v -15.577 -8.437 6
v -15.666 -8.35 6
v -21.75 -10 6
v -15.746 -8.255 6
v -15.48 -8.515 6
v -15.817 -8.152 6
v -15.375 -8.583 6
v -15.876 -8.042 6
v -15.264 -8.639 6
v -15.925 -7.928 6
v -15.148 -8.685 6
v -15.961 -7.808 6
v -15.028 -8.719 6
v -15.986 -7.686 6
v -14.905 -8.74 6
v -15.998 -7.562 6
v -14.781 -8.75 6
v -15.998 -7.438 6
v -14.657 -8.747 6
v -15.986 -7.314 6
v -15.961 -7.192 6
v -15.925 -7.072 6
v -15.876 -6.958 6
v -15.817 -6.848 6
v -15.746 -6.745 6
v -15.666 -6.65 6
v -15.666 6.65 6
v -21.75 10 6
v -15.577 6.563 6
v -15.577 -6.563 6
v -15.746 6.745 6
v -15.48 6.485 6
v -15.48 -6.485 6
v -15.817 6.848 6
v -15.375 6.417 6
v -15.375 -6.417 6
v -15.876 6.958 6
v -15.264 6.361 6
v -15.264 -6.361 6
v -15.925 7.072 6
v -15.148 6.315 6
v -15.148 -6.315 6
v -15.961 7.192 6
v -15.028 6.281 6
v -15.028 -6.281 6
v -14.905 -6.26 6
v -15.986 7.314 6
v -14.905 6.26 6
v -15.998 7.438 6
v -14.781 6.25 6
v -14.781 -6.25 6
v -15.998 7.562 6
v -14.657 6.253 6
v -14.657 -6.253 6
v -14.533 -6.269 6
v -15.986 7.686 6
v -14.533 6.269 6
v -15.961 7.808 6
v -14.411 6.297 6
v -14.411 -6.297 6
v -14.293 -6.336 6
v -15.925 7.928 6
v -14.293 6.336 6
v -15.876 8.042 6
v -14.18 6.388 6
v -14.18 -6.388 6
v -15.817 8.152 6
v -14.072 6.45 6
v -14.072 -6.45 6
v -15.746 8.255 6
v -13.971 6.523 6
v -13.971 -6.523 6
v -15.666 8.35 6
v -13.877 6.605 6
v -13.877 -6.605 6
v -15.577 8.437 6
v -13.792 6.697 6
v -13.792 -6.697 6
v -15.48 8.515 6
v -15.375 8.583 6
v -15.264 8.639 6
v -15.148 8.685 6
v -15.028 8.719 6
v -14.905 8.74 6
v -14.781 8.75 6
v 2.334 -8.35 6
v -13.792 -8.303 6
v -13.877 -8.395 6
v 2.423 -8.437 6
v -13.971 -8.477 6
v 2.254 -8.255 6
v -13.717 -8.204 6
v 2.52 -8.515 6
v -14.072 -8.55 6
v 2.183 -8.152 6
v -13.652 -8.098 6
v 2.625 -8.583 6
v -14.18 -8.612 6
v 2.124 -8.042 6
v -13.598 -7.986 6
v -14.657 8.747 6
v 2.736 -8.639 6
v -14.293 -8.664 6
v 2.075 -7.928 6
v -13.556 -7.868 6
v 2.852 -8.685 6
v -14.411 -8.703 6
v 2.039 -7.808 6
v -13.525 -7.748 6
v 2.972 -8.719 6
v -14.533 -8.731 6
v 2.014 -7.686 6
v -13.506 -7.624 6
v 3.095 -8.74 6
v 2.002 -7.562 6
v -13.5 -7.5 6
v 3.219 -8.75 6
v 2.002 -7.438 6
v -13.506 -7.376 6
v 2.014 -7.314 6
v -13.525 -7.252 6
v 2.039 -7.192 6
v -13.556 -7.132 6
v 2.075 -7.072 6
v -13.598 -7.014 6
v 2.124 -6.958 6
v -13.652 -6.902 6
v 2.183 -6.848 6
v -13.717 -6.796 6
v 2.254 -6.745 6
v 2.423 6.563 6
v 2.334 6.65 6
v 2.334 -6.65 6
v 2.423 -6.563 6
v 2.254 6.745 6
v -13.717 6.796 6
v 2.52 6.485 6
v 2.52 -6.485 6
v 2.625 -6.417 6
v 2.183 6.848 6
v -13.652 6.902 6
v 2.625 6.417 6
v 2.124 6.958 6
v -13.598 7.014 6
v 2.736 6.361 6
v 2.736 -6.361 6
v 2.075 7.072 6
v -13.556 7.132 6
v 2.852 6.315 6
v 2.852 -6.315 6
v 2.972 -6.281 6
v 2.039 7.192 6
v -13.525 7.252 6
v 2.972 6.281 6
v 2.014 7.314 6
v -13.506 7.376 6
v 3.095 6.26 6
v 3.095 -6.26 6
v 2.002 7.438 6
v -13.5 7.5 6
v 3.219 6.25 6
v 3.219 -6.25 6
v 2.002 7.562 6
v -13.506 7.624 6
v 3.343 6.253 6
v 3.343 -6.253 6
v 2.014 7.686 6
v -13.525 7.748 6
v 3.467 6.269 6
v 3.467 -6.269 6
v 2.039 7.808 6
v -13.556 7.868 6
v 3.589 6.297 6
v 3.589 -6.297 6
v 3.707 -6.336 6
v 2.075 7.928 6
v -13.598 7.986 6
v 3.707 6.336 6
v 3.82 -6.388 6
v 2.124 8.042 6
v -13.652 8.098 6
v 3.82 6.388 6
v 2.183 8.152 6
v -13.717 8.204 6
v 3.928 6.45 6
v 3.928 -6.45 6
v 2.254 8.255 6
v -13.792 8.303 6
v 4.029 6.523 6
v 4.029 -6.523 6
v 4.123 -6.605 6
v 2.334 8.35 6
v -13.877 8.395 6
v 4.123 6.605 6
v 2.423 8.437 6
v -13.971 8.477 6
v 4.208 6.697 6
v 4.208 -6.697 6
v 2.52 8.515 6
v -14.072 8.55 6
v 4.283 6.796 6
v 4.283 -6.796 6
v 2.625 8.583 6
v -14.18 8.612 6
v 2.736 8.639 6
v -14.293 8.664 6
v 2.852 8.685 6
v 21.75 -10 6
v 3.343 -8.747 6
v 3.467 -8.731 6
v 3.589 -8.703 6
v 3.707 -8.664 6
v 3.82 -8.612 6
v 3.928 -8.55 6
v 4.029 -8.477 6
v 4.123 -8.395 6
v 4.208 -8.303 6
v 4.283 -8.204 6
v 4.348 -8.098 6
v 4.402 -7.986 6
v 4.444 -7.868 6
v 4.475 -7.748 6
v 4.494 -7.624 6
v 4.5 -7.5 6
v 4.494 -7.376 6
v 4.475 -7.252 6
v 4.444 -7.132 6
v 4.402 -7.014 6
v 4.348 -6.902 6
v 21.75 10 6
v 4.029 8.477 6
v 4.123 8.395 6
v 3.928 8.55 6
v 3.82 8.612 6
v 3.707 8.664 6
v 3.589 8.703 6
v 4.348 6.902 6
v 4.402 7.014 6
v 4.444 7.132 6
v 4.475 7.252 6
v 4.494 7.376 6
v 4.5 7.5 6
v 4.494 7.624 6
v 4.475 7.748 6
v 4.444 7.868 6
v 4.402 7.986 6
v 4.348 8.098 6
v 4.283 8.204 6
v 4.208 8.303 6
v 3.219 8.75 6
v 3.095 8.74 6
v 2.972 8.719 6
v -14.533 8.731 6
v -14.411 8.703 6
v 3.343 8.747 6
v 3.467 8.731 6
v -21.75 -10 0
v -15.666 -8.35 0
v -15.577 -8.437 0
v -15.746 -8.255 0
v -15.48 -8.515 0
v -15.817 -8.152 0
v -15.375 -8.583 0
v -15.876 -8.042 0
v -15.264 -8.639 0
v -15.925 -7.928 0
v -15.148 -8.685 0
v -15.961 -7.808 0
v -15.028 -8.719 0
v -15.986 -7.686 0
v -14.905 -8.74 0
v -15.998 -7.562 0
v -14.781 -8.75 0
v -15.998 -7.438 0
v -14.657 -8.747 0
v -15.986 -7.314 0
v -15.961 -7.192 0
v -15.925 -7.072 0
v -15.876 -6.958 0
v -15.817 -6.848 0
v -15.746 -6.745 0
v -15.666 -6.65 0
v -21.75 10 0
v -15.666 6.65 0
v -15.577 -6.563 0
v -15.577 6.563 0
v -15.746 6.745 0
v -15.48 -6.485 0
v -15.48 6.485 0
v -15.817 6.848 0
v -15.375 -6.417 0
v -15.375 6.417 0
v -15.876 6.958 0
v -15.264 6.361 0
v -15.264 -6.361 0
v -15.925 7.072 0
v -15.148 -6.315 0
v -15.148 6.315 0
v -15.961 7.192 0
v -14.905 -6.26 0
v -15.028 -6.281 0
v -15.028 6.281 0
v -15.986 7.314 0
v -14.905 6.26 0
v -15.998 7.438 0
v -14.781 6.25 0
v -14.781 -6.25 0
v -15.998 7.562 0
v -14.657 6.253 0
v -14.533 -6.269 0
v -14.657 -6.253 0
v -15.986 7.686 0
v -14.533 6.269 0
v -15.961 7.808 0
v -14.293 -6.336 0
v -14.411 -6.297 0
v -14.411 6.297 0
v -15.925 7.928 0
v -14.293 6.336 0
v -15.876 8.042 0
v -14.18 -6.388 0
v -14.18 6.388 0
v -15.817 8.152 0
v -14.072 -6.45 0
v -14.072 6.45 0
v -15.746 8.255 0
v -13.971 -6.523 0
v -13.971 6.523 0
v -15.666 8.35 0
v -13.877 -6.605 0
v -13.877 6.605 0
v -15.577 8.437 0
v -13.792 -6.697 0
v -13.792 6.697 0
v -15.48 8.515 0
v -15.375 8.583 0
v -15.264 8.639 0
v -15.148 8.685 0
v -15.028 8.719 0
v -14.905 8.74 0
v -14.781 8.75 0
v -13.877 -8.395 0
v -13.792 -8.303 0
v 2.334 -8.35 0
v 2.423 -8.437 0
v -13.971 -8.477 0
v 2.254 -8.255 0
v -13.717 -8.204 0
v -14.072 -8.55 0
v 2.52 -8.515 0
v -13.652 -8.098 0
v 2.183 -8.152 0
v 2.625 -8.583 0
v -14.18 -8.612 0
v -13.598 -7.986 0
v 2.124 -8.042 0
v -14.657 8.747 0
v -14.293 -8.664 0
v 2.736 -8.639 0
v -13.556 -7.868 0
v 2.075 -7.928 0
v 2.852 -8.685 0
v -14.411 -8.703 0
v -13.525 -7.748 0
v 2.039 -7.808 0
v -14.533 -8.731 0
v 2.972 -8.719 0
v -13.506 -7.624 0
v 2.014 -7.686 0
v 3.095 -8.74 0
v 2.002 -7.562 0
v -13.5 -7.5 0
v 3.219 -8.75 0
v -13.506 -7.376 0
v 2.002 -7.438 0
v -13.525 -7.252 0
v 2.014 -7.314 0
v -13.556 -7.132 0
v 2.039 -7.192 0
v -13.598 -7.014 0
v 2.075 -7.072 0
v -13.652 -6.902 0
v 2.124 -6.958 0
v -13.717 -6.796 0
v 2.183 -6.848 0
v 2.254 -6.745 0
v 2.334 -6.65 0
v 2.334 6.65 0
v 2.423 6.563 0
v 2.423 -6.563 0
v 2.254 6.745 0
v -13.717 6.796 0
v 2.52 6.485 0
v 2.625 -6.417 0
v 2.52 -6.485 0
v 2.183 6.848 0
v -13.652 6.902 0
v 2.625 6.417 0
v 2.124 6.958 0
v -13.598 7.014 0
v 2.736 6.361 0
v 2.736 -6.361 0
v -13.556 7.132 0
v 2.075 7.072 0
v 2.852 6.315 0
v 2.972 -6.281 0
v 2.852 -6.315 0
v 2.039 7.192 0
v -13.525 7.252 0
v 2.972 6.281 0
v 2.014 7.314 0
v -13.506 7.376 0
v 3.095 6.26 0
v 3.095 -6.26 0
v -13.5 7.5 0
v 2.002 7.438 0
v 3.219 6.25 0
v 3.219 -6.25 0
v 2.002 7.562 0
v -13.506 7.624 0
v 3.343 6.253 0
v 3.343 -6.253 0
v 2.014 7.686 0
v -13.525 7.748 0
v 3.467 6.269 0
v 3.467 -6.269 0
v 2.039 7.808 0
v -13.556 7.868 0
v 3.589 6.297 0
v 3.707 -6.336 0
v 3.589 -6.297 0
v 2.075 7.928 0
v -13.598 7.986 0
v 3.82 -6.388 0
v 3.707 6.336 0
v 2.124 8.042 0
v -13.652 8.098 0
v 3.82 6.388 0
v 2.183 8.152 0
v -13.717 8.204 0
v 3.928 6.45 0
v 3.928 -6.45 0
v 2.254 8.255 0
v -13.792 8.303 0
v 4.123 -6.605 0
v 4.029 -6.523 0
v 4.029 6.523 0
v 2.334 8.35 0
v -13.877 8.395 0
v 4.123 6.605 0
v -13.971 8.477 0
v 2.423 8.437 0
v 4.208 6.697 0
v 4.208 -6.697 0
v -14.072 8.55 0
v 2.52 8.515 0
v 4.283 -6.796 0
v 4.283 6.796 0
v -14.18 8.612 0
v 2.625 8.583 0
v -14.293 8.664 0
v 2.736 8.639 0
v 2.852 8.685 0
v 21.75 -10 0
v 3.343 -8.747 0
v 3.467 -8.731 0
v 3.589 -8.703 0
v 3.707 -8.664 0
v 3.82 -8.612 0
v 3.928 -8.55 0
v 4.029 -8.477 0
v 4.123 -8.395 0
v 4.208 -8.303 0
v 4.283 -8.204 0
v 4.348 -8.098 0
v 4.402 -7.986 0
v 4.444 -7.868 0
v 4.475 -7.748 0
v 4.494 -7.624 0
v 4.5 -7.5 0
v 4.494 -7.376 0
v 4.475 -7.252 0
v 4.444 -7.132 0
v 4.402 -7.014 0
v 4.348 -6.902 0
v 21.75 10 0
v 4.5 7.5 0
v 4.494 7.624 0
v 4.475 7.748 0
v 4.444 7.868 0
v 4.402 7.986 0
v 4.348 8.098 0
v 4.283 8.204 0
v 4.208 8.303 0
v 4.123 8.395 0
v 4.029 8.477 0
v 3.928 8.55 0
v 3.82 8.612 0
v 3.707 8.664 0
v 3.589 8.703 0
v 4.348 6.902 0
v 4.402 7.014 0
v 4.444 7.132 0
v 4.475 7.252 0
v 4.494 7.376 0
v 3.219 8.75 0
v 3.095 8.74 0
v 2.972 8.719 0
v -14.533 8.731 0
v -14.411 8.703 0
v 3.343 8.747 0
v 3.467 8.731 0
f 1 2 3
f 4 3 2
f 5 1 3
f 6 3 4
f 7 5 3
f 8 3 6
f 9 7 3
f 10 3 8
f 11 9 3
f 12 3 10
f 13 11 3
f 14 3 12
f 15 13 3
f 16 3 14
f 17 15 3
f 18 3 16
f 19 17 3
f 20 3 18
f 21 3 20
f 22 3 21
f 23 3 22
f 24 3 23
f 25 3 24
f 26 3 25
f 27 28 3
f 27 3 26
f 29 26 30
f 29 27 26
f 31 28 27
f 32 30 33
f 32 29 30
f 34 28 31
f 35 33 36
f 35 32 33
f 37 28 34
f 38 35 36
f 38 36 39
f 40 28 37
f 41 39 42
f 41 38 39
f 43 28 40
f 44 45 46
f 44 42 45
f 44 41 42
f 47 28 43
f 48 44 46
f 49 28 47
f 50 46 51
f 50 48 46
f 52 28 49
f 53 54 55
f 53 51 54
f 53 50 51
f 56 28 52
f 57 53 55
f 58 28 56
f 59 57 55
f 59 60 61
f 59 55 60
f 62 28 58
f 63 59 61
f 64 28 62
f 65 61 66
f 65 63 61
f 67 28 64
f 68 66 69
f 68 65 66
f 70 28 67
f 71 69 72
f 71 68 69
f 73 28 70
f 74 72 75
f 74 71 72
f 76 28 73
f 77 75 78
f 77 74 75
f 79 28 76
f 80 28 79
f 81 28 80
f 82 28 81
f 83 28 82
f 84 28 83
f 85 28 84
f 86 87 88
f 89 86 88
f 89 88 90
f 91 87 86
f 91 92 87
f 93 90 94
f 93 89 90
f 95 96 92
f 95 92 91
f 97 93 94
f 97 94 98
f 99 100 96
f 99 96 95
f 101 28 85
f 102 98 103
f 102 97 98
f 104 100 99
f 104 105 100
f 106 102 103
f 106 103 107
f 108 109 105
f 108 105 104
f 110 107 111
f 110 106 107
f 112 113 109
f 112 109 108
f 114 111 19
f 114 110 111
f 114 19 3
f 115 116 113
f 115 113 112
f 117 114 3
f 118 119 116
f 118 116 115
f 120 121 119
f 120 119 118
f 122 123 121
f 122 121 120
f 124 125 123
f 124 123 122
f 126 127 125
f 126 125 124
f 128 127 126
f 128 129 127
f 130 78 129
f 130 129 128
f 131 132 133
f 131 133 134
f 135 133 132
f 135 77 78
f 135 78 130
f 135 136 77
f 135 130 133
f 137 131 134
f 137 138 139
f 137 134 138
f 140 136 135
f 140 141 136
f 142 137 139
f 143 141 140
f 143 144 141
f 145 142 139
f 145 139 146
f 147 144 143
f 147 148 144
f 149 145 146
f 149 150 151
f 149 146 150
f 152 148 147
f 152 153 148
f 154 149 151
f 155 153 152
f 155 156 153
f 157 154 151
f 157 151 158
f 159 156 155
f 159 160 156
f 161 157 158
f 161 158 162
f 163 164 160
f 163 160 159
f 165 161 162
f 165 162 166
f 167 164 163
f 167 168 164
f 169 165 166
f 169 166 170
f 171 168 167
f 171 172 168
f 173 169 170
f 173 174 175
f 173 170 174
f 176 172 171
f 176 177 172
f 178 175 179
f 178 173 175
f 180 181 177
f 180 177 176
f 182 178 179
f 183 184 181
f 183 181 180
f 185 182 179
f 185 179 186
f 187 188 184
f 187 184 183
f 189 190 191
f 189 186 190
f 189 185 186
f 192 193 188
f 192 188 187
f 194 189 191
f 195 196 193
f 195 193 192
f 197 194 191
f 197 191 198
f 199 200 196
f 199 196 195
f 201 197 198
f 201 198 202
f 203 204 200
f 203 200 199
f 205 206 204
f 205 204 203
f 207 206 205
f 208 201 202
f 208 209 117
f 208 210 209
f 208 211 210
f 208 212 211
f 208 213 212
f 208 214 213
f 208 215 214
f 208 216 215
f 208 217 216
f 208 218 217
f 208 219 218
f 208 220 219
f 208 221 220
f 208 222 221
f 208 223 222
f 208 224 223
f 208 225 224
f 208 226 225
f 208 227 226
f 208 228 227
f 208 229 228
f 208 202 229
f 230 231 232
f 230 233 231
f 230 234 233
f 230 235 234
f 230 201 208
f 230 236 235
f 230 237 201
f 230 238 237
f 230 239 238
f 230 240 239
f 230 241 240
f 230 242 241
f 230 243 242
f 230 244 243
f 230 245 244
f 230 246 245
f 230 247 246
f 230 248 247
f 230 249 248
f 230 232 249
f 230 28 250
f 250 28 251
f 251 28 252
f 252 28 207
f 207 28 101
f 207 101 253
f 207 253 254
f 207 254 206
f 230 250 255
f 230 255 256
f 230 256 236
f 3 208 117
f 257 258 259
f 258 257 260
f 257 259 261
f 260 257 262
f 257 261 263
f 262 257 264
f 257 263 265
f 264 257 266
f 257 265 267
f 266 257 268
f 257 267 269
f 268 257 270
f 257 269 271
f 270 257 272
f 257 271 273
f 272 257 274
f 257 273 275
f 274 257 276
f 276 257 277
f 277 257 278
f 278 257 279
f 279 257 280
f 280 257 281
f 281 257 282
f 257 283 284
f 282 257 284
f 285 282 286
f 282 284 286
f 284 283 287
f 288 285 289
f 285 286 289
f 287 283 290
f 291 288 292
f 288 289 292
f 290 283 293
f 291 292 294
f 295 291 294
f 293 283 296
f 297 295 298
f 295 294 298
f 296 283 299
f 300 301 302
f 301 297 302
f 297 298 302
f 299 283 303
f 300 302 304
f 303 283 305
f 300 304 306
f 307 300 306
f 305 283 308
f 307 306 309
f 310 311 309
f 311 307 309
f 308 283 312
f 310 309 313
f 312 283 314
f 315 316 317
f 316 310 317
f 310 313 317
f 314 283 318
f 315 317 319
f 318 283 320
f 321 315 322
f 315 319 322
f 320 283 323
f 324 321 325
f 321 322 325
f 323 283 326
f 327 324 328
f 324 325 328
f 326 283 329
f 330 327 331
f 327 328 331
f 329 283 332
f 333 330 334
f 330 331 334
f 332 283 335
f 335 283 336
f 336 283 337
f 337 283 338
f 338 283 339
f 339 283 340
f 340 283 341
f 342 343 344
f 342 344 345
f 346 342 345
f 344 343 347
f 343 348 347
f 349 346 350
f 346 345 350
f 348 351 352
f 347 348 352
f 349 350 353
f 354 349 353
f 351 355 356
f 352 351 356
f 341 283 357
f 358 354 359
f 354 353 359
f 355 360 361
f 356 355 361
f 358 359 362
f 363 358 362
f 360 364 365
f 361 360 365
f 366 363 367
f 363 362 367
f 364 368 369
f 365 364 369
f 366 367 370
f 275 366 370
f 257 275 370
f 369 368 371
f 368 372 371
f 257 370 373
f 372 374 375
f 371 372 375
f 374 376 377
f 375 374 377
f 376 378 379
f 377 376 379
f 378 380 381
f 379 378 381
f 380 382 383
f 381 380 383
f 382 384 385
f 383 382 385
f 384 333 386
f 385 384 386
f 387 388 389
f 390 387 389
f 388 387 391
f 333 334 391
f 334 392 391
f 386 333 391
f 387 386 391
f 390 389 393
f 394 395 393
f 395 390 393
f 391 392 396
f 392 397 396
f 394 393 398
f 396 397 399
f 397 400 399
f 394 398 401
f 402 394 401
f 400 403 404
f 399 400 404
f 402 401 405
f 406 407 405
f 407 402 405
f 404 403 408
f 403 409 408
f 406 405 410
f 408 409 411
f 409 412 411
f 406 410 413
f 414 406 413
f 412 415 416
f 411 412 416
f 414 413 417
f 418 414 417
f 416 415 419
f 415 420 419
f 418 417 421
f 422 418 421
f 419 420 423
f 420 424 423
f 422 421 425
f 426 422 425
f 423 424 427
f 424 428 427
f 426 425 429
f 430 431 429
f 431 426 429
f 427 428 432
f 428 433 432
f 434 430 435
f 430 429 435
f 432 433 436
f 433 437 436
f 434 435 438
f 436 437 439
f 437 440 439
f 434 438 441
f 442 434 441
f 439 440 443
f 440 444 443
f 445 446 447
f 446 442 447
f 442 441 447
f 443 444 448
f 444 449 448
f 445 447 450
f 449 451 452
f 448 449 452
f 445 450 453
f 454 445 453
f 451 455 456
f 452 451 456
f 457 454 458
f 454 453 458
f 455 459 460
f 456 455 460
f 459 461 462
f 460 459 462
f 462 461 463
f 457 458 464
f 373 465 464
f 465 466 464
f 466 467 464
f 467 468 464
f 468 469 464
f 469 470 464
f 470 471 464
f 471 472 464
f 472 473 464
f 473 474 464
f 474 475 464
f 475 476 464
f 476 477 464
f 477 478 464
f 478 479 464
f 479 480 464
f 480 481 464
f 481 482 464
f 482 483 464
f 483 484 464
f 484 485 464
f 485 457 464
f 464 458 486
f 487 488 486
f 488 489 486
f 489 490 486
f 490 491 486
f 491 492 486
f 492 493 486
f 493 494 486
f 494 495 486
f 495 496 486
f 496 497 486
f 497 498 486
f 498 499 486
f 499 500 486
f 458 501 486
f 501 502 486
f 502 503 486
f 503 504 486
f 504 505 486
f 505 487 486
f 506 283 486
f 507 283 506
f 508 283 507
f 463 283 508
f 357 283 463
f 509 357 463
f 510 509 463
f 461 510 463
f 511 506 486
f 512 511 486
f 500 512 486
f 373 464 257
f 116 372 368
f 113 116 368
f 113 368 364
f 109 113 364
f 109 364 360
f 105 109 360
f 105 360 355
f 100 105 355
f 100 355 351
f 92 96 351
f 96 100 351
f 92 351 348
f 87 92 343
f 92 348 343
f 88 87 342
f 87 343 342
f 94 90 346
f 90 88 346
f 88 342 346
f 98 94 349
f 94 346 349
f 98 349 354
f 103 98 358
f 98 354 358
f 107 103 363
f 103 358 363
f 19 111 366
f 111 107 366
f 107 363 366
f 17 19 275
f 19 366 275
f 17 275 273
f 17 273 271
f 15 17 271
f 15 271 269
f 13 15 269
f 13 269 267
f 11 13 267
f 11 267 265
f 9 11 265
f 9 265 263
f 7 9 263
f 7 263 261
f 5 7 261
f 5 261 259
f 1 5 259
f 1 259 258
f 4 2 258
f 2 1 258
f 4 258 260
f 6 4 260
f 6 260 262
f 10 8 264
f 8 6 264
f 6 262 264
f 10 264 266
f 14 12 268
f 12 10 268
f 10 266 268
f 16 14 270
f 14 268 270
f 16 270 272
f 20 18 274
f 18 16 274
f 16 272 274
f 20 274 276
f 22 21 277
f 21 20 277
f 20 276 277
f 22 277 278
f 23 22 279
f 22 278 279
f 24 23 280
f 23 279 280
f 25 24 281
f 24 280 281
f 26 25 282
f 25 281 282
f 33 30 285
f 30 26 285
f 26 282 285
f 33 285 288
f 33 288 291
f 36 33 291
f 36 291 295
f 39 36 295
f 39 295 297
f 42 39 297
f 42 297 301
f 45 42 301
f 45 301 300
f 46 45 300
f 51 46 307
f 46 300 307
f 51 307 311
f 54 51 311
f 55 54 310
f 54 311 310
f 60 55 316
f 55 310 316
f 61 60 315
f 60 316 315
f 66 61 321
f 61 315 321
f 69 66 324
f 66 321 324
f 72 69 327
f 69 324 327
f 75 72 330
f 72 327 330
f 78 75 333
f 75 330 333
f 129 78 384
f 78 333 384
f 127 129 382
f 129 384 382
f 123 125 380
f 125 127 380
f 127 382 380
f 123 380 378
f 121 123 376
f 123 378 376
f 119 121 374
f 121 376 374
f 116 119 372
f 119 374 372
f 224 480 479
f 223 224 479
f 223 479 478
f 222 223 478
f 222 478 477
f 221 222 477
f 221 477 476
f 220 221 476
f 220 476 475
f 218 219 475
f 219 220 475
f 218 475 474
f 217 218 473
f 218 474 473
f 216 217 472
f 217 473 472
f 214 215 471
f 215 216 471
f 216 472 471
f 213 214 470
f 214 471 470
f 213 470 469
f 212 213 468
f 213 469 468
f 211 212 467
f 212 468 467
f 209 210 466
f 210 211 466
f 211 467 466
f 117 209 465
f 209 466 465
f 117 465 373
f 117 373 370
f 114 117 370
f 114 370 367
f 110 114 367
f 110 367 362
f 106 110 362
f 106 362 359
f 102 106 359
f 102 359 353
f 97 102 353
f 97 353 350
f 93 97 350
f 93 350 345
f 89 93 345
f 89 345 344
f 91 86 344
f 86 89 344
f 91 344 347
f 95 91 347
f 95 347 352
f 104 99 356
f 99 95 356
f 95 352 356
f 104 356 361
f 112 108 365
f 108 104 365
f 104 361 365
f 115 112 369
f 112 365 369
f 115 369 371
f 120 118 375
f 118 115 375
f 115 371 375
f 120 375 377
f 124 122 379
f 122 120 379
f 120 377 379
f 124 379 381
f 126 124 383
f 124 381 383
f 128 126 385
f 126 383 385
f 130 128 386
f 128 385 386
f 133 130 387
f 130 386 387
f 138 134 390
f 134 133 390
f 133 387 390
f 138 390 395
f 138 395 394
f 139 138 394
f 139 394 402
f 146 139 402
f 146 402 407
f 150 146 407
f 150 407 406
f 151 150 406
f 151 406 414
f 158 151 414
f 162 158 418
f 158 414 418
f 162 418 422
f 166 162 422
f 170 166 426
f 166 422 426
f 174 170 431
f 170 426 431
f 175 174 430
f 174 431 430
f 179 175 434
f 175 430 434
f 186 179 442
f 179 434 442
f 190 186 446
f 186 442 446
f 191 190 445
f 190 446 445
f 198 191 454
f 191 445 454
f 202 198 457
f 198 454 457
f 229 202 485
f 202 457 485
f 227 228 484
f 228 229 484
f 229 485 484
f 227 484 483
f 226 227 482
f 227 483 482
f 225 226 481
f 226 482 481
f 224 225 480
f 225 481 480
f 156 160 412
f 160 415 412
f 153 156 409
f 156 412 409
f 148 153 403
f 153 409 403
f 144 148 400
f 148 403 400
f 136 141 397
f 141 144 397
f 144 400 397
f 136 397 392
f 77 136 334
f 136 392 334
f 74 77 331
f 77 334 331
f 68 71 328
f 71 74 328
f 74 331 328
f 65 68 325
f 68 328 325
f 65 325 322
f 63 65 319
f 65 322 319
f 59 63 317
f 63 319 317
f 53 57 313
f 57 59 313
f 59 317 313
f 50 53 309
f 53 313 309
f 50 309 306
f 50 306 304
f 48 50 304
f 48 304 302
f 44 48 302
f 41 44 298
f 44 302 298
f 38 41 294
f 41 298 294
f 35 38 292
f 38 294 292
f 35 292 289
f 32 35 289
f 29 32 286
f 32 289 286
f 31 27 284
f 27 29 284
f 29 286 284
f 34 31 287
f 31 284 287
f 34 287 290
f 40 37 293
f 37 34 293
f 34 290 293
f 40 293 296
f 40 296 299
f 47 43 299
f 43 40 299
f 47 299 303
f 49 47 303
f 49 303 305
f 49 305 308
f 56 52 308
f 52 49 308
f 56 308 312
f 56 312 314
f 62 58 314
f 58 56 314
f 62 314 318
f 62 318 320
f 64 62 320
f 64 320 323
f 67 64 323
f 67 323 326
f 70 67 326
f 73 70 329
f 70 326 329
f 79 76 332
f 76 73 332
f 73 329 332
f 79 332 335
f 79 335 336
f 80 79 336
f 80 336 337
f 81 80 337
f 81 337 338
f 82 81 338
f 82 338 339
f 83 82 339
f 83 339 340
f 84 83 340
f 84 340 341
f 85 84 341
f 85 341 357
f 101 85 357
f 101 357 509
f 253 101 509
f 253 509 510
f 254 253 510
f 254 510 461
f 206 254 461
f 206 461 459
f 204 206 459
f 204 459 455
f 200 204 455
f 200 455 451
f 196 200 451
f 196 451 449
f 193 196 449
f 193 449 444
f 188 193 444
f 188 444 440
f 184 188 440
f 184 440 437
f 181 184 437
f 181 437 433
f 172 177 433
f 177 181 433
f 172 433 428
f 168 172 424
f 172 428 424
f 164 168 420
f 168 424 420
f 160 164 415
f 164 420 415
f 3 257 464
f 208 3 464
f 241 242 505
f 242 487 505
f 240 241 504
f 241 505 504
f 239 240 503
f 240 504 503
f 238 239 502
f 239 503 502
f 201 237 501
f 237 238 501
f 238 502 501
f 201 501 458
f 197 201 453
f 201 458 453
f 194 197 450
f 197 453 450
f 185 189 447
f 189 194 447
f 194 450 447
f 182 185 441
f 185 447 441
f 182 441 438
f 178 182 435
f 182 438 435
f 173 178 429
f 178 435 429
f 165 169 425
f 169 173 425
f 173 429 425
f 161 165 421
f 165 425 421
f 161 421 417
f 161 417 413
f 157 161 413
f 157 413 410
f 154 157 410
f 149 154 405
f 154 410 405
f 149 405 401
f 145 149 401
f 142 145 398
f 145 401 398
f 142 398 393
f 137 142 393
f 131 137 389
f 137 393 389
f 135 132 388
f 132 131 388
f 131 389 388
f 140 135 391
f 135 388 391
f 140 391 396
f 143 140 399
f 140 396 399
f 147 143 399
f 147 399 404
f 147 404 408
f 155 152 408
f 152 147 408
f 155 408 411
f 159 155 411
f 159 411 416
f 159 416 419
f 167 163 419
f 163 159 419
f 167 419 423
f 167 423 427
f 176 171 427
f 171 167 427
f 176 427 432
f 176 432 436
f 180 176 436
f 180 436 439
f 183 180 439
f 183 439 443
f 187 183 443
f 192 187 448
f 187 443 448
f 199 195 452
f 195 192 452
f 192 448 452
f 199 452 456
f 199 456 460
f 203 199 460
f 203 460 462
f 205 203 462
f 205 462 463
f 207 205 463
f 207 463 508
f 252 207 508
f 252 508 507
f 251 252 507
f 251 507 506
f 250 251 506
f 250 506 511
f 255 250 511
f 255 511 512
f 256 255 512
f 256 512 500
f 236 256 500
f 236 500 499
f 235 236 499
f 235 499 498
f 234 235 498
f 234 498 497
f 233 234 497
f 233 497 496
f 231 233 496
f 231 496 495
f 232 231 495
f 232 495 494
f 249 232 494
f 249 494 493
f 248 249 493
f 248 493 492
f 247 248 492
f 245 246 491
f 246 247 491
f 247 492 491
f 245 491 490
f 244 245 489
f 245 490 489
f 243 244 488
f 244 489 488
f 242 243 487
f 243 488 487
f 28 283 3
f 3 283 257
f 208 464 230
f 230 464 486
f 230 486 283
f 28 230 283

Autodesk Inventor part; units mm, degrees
ref_plane "YZ Plane" through (0, 0, 0) normal (1, 0, 0) x (0, 1, 0)
ref_plane "XZ Plane" through (0, 0, 0) normal (0, 1, 0) x (-1, 0, 0)
ref_plane "XY Plane" through (0, 0, 0) normal (0, 0, 1) x (1, 0, 0)
sketch "스케치1" plane through (0, 0, 0) normal (0, 0, 1) x (1, 0, 0)
  line L0 (-21.75, -10) -> (21.75, -10)
  line L1 (21.75, -10) -> (21.75, 10)
  line L2 (21.75, 10) -> (-21.75, 10)
  line L3 (-21.75, 10) -> (-21.75, -10)
  line L4 (-21.75, -10) -> (21.75, 10) construction
  line L5 (21.75, -10) -> (-21.75, 10) construction
  circle A0 centre (-14.75, -7.5) radius 1.25
  circle A1 centre (3.25, -7.5) radius 1.25
  circle A2 centre (-14.75, 7.5) radius 1.25
  circle A3 centre (3.25, 7.5) radius 1.25
  point P0 (0, 0)
  dimension "d0" = 43.5
  dimension "d1" = 20
  dimension "d4" = 2.5
  dimension "d5" = 2.5
  dimension "d6" = 7
  dimension "d9" = 18
  dimension "d12" = 15
extrude "돌출1" add sketch "스케치1" along normal blind 6
properties part number "dc_convertor" material "고무, 검은색"
